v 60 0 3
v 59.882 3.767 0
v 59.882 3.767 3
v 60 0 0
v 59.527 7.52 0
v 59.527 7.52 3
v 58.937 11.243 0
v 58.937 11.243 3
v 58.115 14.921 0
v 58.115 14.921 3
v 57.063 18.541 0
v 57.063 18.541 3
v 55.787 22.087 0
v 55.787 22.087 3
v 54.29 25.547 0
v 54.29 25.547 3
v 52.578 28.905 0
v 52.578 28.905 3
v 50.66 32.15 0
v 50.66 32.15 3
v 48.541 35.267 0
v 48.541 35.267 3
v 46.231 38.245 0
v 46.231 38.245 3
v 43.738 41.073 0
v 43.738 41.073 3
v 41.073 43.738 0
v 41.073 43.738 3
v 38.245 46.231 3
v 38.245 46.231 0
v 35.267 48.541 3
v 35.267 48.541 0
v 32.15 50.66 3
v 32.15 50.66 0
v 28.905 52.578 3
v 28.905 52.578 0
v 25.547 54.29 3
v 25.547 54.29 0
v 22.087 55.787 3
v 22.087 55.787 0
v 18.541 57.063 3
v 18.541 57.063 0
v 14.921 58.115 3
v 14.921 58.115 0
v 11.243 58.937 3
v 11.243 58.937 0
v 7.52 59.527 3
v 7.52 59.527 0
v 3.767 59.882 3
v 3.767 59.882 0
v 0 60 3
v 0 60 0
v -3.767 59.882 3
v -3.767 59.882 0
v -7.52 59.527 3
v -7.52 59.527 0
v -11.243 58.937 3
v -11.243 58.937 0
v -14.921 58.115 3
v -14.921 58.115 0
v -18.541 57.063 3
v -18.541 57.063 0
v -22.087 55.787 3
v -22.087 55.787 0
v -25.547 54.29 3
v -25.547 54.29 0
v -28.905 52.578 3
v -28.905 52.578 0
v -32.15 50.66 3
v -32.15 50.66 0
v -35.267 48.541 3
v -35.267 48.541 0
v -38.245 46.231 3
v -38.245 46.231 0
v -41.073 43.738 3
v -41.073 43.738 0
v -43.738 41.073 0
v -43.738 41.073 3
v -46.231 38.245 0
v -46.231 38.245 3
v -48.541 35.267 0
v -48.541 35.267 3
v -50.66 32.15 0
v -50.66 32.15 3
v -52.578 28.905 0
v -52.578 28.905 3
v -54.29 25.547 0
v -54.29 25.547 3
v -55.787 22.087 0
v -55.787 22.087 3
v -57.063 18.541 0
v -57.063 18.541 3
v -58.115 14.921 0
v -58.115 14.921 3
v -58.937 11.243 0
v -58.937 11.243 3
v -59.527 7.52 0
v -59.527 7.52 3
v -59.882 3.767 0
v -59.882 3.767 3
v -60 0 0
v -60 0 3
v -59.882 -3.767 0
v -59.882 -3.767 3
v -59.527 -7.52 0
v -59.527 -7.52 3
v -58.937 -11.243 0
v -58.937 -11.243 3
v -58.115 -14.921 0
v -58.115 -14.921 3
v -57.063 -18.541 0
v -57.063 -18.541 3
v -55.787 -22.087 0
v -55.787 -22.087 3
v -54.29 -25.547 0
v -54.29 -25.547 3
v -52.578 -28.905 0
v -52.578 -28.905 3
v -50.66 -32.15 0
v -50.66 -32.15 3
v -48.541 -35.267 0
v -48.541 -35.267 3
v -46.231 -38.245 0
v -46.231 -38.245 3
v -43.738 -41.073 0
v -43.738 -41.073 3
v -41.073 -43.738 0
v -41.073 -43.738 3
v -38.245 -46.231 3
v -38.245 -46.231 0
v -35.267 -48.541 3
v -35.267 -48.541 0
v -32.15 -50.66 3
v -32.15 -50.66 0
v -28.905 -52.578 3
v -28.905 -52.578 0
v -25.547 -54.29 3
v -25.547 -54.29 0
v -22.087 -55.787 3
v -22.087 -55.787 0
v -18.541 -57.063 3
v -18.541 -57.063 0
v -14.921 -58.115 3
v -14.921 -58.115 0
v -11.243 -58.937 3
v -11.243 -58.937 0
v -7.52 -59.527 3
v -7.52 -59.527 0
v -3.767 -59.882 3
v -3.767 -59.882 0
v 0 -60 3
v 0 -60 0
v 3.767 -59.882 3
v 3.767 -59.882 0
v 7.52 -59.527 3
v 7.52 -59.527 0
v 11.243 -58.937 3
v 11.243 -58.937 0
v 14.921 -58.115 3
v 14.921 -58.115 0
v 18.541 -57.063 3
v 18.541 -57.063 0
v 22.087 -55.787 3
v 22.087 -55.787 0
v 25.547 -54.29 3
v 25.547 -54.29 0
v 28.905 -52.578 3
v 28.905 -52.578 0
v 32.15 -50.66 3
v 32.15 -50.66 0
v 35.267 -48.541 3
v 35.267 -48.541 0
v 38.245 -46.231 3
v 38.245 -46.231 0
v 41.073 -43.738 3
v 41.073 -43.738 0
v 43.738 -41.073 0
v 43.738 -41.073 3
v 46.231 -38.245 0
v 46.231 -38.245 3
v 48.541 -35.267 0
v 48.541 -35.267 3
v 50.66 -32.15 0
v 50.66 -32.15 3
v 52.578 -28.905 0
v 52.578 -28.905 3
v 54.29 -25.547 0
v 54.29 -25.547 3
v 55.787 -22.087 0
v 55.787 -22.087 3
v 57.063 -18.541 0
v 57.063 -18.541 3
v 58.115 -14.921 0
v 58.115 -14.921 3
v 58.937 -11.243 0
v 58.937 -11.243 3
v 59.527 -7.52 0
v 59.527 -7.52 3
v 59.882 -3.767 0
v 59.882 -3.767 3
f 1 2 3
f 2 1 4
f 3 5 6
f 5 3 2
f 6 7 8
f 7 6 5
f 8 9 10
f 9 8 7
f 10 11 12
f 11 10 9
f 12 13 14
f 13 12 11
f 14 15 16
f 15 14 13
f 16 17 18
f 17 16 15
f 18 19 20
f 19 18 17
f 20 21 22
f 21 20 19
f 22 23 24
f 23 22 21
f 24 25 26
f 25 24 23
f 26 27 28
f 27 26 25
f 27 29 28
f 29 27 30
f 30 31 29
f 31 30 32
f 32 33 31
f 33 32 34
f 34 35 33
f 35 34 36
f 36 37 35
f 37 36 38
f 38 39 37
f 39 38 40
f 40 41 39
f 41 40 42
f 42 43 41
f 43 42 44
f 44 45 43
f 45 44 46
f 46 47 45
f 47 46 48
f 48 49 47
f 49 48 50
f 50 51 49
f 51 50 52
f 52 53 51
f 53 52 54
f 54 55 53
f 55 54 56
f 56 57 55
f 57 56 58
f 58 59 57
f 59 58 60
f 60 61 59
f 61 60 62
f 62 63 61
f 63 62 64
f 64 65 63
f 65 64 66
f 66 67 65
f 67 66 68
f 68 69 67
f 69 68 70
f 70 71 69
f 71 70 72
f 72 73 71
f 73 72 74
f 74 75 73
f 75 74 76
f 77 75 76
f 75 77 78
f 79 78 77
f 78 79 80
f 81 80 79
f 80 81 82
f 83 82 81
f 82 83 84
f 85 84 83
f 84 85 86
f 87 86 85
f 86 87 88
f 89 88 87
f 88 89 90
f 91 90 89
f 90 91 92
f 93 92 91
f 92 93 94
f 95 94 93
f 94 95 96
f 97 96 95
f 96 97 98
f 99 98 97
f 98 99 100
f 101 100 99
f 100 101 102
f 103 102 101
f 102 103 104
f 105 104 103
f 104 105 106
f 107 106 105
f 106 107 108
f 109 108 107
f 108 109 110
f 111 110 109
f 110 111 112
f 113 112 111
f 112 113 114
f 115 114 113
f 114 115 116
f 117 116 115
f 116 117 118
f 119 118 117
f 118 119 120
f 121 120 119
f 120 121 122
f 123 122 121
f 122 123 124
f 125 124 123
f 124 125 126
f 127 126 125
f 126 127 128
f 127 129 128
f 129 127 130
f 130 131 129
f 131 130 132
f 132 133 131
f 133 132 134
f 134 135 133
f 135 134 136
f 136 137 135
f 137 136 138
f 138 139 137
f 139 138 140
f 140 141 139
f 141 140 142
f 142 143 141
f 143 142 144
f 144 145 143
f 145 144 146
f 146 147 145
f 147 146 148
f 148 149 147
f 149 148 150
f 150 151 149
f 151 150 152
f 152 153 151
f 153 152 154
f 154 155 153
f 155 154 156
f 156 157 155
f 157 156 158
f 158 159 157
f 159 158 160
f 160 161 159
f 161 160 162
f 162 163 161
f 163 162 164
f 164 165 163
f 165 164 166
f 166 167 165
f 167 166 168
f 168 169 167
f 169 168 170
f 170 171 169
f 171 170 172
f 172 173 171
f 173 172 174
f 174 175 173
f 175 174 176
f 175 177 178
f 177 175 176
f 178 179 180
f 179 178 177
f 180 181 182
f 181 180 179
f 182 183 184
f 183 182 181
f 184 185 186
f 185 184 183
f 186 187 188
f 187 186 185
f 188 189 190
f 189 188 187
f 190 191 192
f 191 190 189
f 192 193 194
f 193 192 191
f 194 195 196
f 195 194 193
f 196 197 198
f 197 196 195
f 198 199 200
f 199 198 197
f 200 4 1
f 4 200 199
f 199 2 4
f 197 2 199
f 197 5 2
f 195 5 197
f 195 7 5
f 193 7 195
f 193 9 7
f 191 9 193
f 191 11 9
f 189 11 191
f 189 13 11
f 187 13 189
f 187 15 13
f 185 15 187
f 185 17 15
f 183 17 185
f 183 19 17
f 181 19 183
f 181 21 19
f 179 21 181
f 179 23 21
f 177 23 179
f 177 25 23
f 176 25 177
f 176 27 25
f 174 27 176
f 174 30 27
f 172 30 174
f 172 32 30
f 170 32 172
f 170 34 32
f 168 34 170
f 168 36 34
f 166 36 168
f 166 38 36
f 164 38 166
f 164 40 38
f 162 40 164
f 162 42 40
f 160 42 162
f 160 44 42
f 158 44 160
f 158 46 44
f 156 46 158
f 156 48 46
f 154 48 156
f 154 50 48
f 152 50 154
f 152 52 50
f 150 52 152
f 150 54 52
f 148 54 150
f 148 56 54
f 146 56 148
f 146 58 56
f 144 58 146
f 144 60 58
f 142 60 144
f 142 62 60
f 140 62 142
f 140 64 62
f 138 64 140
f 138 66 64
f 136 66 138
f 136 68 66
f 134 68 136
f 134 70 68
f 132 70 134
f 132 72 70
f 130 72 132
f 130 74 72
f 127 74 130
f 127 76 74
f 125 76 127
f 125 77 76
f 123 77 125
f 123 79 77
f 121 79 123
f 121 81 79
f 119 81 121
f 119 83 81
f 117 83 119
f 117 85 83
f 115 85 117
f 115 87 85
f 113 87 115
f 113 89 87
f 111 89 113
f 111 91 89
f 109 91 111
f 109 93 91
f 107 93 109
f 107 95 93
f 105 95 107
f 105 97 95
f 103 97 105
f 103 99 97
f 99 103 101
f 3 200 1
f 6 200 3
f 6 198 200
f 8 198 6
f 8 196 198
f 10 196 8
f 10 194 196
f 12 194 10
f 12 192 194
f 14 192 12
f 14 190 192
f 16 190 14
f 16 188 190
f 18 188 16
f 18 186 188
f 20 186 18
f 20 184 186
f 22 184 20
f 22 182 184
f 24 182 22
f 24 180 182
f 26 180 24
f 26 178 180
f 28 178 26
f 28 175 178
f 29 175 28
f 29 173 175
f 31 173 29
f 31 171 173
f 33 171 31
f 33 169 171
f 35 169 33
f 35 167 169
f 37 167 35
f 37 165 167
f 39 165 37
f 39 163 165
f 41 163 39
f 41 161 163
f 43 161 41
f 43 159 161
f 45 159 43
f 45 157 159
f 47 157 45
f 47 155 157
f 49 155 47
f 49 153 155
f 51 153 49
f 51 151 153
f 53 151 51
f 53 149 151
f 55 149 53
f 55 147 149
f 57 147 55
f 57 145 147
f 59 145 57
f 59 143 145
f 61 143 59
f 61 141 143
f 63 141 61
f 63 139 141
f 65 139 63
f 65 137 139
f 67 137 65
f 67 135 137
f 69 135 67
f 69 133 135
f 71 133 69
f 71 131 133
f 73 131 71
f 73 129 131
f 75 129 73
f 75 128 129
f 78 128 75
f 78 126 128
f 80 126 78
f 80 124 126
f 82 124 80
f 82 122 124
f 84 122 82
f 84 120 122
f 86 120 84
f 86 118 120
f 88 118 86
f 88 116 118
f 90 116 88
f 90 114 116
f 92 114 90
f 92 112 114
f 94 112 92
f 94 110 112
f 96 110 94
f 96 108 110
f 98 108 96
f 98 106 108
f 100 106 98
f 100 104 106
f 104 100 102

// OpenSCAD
$fn=100; // nbr faces

//Slab
cylinder(h = 3, r = 60);
